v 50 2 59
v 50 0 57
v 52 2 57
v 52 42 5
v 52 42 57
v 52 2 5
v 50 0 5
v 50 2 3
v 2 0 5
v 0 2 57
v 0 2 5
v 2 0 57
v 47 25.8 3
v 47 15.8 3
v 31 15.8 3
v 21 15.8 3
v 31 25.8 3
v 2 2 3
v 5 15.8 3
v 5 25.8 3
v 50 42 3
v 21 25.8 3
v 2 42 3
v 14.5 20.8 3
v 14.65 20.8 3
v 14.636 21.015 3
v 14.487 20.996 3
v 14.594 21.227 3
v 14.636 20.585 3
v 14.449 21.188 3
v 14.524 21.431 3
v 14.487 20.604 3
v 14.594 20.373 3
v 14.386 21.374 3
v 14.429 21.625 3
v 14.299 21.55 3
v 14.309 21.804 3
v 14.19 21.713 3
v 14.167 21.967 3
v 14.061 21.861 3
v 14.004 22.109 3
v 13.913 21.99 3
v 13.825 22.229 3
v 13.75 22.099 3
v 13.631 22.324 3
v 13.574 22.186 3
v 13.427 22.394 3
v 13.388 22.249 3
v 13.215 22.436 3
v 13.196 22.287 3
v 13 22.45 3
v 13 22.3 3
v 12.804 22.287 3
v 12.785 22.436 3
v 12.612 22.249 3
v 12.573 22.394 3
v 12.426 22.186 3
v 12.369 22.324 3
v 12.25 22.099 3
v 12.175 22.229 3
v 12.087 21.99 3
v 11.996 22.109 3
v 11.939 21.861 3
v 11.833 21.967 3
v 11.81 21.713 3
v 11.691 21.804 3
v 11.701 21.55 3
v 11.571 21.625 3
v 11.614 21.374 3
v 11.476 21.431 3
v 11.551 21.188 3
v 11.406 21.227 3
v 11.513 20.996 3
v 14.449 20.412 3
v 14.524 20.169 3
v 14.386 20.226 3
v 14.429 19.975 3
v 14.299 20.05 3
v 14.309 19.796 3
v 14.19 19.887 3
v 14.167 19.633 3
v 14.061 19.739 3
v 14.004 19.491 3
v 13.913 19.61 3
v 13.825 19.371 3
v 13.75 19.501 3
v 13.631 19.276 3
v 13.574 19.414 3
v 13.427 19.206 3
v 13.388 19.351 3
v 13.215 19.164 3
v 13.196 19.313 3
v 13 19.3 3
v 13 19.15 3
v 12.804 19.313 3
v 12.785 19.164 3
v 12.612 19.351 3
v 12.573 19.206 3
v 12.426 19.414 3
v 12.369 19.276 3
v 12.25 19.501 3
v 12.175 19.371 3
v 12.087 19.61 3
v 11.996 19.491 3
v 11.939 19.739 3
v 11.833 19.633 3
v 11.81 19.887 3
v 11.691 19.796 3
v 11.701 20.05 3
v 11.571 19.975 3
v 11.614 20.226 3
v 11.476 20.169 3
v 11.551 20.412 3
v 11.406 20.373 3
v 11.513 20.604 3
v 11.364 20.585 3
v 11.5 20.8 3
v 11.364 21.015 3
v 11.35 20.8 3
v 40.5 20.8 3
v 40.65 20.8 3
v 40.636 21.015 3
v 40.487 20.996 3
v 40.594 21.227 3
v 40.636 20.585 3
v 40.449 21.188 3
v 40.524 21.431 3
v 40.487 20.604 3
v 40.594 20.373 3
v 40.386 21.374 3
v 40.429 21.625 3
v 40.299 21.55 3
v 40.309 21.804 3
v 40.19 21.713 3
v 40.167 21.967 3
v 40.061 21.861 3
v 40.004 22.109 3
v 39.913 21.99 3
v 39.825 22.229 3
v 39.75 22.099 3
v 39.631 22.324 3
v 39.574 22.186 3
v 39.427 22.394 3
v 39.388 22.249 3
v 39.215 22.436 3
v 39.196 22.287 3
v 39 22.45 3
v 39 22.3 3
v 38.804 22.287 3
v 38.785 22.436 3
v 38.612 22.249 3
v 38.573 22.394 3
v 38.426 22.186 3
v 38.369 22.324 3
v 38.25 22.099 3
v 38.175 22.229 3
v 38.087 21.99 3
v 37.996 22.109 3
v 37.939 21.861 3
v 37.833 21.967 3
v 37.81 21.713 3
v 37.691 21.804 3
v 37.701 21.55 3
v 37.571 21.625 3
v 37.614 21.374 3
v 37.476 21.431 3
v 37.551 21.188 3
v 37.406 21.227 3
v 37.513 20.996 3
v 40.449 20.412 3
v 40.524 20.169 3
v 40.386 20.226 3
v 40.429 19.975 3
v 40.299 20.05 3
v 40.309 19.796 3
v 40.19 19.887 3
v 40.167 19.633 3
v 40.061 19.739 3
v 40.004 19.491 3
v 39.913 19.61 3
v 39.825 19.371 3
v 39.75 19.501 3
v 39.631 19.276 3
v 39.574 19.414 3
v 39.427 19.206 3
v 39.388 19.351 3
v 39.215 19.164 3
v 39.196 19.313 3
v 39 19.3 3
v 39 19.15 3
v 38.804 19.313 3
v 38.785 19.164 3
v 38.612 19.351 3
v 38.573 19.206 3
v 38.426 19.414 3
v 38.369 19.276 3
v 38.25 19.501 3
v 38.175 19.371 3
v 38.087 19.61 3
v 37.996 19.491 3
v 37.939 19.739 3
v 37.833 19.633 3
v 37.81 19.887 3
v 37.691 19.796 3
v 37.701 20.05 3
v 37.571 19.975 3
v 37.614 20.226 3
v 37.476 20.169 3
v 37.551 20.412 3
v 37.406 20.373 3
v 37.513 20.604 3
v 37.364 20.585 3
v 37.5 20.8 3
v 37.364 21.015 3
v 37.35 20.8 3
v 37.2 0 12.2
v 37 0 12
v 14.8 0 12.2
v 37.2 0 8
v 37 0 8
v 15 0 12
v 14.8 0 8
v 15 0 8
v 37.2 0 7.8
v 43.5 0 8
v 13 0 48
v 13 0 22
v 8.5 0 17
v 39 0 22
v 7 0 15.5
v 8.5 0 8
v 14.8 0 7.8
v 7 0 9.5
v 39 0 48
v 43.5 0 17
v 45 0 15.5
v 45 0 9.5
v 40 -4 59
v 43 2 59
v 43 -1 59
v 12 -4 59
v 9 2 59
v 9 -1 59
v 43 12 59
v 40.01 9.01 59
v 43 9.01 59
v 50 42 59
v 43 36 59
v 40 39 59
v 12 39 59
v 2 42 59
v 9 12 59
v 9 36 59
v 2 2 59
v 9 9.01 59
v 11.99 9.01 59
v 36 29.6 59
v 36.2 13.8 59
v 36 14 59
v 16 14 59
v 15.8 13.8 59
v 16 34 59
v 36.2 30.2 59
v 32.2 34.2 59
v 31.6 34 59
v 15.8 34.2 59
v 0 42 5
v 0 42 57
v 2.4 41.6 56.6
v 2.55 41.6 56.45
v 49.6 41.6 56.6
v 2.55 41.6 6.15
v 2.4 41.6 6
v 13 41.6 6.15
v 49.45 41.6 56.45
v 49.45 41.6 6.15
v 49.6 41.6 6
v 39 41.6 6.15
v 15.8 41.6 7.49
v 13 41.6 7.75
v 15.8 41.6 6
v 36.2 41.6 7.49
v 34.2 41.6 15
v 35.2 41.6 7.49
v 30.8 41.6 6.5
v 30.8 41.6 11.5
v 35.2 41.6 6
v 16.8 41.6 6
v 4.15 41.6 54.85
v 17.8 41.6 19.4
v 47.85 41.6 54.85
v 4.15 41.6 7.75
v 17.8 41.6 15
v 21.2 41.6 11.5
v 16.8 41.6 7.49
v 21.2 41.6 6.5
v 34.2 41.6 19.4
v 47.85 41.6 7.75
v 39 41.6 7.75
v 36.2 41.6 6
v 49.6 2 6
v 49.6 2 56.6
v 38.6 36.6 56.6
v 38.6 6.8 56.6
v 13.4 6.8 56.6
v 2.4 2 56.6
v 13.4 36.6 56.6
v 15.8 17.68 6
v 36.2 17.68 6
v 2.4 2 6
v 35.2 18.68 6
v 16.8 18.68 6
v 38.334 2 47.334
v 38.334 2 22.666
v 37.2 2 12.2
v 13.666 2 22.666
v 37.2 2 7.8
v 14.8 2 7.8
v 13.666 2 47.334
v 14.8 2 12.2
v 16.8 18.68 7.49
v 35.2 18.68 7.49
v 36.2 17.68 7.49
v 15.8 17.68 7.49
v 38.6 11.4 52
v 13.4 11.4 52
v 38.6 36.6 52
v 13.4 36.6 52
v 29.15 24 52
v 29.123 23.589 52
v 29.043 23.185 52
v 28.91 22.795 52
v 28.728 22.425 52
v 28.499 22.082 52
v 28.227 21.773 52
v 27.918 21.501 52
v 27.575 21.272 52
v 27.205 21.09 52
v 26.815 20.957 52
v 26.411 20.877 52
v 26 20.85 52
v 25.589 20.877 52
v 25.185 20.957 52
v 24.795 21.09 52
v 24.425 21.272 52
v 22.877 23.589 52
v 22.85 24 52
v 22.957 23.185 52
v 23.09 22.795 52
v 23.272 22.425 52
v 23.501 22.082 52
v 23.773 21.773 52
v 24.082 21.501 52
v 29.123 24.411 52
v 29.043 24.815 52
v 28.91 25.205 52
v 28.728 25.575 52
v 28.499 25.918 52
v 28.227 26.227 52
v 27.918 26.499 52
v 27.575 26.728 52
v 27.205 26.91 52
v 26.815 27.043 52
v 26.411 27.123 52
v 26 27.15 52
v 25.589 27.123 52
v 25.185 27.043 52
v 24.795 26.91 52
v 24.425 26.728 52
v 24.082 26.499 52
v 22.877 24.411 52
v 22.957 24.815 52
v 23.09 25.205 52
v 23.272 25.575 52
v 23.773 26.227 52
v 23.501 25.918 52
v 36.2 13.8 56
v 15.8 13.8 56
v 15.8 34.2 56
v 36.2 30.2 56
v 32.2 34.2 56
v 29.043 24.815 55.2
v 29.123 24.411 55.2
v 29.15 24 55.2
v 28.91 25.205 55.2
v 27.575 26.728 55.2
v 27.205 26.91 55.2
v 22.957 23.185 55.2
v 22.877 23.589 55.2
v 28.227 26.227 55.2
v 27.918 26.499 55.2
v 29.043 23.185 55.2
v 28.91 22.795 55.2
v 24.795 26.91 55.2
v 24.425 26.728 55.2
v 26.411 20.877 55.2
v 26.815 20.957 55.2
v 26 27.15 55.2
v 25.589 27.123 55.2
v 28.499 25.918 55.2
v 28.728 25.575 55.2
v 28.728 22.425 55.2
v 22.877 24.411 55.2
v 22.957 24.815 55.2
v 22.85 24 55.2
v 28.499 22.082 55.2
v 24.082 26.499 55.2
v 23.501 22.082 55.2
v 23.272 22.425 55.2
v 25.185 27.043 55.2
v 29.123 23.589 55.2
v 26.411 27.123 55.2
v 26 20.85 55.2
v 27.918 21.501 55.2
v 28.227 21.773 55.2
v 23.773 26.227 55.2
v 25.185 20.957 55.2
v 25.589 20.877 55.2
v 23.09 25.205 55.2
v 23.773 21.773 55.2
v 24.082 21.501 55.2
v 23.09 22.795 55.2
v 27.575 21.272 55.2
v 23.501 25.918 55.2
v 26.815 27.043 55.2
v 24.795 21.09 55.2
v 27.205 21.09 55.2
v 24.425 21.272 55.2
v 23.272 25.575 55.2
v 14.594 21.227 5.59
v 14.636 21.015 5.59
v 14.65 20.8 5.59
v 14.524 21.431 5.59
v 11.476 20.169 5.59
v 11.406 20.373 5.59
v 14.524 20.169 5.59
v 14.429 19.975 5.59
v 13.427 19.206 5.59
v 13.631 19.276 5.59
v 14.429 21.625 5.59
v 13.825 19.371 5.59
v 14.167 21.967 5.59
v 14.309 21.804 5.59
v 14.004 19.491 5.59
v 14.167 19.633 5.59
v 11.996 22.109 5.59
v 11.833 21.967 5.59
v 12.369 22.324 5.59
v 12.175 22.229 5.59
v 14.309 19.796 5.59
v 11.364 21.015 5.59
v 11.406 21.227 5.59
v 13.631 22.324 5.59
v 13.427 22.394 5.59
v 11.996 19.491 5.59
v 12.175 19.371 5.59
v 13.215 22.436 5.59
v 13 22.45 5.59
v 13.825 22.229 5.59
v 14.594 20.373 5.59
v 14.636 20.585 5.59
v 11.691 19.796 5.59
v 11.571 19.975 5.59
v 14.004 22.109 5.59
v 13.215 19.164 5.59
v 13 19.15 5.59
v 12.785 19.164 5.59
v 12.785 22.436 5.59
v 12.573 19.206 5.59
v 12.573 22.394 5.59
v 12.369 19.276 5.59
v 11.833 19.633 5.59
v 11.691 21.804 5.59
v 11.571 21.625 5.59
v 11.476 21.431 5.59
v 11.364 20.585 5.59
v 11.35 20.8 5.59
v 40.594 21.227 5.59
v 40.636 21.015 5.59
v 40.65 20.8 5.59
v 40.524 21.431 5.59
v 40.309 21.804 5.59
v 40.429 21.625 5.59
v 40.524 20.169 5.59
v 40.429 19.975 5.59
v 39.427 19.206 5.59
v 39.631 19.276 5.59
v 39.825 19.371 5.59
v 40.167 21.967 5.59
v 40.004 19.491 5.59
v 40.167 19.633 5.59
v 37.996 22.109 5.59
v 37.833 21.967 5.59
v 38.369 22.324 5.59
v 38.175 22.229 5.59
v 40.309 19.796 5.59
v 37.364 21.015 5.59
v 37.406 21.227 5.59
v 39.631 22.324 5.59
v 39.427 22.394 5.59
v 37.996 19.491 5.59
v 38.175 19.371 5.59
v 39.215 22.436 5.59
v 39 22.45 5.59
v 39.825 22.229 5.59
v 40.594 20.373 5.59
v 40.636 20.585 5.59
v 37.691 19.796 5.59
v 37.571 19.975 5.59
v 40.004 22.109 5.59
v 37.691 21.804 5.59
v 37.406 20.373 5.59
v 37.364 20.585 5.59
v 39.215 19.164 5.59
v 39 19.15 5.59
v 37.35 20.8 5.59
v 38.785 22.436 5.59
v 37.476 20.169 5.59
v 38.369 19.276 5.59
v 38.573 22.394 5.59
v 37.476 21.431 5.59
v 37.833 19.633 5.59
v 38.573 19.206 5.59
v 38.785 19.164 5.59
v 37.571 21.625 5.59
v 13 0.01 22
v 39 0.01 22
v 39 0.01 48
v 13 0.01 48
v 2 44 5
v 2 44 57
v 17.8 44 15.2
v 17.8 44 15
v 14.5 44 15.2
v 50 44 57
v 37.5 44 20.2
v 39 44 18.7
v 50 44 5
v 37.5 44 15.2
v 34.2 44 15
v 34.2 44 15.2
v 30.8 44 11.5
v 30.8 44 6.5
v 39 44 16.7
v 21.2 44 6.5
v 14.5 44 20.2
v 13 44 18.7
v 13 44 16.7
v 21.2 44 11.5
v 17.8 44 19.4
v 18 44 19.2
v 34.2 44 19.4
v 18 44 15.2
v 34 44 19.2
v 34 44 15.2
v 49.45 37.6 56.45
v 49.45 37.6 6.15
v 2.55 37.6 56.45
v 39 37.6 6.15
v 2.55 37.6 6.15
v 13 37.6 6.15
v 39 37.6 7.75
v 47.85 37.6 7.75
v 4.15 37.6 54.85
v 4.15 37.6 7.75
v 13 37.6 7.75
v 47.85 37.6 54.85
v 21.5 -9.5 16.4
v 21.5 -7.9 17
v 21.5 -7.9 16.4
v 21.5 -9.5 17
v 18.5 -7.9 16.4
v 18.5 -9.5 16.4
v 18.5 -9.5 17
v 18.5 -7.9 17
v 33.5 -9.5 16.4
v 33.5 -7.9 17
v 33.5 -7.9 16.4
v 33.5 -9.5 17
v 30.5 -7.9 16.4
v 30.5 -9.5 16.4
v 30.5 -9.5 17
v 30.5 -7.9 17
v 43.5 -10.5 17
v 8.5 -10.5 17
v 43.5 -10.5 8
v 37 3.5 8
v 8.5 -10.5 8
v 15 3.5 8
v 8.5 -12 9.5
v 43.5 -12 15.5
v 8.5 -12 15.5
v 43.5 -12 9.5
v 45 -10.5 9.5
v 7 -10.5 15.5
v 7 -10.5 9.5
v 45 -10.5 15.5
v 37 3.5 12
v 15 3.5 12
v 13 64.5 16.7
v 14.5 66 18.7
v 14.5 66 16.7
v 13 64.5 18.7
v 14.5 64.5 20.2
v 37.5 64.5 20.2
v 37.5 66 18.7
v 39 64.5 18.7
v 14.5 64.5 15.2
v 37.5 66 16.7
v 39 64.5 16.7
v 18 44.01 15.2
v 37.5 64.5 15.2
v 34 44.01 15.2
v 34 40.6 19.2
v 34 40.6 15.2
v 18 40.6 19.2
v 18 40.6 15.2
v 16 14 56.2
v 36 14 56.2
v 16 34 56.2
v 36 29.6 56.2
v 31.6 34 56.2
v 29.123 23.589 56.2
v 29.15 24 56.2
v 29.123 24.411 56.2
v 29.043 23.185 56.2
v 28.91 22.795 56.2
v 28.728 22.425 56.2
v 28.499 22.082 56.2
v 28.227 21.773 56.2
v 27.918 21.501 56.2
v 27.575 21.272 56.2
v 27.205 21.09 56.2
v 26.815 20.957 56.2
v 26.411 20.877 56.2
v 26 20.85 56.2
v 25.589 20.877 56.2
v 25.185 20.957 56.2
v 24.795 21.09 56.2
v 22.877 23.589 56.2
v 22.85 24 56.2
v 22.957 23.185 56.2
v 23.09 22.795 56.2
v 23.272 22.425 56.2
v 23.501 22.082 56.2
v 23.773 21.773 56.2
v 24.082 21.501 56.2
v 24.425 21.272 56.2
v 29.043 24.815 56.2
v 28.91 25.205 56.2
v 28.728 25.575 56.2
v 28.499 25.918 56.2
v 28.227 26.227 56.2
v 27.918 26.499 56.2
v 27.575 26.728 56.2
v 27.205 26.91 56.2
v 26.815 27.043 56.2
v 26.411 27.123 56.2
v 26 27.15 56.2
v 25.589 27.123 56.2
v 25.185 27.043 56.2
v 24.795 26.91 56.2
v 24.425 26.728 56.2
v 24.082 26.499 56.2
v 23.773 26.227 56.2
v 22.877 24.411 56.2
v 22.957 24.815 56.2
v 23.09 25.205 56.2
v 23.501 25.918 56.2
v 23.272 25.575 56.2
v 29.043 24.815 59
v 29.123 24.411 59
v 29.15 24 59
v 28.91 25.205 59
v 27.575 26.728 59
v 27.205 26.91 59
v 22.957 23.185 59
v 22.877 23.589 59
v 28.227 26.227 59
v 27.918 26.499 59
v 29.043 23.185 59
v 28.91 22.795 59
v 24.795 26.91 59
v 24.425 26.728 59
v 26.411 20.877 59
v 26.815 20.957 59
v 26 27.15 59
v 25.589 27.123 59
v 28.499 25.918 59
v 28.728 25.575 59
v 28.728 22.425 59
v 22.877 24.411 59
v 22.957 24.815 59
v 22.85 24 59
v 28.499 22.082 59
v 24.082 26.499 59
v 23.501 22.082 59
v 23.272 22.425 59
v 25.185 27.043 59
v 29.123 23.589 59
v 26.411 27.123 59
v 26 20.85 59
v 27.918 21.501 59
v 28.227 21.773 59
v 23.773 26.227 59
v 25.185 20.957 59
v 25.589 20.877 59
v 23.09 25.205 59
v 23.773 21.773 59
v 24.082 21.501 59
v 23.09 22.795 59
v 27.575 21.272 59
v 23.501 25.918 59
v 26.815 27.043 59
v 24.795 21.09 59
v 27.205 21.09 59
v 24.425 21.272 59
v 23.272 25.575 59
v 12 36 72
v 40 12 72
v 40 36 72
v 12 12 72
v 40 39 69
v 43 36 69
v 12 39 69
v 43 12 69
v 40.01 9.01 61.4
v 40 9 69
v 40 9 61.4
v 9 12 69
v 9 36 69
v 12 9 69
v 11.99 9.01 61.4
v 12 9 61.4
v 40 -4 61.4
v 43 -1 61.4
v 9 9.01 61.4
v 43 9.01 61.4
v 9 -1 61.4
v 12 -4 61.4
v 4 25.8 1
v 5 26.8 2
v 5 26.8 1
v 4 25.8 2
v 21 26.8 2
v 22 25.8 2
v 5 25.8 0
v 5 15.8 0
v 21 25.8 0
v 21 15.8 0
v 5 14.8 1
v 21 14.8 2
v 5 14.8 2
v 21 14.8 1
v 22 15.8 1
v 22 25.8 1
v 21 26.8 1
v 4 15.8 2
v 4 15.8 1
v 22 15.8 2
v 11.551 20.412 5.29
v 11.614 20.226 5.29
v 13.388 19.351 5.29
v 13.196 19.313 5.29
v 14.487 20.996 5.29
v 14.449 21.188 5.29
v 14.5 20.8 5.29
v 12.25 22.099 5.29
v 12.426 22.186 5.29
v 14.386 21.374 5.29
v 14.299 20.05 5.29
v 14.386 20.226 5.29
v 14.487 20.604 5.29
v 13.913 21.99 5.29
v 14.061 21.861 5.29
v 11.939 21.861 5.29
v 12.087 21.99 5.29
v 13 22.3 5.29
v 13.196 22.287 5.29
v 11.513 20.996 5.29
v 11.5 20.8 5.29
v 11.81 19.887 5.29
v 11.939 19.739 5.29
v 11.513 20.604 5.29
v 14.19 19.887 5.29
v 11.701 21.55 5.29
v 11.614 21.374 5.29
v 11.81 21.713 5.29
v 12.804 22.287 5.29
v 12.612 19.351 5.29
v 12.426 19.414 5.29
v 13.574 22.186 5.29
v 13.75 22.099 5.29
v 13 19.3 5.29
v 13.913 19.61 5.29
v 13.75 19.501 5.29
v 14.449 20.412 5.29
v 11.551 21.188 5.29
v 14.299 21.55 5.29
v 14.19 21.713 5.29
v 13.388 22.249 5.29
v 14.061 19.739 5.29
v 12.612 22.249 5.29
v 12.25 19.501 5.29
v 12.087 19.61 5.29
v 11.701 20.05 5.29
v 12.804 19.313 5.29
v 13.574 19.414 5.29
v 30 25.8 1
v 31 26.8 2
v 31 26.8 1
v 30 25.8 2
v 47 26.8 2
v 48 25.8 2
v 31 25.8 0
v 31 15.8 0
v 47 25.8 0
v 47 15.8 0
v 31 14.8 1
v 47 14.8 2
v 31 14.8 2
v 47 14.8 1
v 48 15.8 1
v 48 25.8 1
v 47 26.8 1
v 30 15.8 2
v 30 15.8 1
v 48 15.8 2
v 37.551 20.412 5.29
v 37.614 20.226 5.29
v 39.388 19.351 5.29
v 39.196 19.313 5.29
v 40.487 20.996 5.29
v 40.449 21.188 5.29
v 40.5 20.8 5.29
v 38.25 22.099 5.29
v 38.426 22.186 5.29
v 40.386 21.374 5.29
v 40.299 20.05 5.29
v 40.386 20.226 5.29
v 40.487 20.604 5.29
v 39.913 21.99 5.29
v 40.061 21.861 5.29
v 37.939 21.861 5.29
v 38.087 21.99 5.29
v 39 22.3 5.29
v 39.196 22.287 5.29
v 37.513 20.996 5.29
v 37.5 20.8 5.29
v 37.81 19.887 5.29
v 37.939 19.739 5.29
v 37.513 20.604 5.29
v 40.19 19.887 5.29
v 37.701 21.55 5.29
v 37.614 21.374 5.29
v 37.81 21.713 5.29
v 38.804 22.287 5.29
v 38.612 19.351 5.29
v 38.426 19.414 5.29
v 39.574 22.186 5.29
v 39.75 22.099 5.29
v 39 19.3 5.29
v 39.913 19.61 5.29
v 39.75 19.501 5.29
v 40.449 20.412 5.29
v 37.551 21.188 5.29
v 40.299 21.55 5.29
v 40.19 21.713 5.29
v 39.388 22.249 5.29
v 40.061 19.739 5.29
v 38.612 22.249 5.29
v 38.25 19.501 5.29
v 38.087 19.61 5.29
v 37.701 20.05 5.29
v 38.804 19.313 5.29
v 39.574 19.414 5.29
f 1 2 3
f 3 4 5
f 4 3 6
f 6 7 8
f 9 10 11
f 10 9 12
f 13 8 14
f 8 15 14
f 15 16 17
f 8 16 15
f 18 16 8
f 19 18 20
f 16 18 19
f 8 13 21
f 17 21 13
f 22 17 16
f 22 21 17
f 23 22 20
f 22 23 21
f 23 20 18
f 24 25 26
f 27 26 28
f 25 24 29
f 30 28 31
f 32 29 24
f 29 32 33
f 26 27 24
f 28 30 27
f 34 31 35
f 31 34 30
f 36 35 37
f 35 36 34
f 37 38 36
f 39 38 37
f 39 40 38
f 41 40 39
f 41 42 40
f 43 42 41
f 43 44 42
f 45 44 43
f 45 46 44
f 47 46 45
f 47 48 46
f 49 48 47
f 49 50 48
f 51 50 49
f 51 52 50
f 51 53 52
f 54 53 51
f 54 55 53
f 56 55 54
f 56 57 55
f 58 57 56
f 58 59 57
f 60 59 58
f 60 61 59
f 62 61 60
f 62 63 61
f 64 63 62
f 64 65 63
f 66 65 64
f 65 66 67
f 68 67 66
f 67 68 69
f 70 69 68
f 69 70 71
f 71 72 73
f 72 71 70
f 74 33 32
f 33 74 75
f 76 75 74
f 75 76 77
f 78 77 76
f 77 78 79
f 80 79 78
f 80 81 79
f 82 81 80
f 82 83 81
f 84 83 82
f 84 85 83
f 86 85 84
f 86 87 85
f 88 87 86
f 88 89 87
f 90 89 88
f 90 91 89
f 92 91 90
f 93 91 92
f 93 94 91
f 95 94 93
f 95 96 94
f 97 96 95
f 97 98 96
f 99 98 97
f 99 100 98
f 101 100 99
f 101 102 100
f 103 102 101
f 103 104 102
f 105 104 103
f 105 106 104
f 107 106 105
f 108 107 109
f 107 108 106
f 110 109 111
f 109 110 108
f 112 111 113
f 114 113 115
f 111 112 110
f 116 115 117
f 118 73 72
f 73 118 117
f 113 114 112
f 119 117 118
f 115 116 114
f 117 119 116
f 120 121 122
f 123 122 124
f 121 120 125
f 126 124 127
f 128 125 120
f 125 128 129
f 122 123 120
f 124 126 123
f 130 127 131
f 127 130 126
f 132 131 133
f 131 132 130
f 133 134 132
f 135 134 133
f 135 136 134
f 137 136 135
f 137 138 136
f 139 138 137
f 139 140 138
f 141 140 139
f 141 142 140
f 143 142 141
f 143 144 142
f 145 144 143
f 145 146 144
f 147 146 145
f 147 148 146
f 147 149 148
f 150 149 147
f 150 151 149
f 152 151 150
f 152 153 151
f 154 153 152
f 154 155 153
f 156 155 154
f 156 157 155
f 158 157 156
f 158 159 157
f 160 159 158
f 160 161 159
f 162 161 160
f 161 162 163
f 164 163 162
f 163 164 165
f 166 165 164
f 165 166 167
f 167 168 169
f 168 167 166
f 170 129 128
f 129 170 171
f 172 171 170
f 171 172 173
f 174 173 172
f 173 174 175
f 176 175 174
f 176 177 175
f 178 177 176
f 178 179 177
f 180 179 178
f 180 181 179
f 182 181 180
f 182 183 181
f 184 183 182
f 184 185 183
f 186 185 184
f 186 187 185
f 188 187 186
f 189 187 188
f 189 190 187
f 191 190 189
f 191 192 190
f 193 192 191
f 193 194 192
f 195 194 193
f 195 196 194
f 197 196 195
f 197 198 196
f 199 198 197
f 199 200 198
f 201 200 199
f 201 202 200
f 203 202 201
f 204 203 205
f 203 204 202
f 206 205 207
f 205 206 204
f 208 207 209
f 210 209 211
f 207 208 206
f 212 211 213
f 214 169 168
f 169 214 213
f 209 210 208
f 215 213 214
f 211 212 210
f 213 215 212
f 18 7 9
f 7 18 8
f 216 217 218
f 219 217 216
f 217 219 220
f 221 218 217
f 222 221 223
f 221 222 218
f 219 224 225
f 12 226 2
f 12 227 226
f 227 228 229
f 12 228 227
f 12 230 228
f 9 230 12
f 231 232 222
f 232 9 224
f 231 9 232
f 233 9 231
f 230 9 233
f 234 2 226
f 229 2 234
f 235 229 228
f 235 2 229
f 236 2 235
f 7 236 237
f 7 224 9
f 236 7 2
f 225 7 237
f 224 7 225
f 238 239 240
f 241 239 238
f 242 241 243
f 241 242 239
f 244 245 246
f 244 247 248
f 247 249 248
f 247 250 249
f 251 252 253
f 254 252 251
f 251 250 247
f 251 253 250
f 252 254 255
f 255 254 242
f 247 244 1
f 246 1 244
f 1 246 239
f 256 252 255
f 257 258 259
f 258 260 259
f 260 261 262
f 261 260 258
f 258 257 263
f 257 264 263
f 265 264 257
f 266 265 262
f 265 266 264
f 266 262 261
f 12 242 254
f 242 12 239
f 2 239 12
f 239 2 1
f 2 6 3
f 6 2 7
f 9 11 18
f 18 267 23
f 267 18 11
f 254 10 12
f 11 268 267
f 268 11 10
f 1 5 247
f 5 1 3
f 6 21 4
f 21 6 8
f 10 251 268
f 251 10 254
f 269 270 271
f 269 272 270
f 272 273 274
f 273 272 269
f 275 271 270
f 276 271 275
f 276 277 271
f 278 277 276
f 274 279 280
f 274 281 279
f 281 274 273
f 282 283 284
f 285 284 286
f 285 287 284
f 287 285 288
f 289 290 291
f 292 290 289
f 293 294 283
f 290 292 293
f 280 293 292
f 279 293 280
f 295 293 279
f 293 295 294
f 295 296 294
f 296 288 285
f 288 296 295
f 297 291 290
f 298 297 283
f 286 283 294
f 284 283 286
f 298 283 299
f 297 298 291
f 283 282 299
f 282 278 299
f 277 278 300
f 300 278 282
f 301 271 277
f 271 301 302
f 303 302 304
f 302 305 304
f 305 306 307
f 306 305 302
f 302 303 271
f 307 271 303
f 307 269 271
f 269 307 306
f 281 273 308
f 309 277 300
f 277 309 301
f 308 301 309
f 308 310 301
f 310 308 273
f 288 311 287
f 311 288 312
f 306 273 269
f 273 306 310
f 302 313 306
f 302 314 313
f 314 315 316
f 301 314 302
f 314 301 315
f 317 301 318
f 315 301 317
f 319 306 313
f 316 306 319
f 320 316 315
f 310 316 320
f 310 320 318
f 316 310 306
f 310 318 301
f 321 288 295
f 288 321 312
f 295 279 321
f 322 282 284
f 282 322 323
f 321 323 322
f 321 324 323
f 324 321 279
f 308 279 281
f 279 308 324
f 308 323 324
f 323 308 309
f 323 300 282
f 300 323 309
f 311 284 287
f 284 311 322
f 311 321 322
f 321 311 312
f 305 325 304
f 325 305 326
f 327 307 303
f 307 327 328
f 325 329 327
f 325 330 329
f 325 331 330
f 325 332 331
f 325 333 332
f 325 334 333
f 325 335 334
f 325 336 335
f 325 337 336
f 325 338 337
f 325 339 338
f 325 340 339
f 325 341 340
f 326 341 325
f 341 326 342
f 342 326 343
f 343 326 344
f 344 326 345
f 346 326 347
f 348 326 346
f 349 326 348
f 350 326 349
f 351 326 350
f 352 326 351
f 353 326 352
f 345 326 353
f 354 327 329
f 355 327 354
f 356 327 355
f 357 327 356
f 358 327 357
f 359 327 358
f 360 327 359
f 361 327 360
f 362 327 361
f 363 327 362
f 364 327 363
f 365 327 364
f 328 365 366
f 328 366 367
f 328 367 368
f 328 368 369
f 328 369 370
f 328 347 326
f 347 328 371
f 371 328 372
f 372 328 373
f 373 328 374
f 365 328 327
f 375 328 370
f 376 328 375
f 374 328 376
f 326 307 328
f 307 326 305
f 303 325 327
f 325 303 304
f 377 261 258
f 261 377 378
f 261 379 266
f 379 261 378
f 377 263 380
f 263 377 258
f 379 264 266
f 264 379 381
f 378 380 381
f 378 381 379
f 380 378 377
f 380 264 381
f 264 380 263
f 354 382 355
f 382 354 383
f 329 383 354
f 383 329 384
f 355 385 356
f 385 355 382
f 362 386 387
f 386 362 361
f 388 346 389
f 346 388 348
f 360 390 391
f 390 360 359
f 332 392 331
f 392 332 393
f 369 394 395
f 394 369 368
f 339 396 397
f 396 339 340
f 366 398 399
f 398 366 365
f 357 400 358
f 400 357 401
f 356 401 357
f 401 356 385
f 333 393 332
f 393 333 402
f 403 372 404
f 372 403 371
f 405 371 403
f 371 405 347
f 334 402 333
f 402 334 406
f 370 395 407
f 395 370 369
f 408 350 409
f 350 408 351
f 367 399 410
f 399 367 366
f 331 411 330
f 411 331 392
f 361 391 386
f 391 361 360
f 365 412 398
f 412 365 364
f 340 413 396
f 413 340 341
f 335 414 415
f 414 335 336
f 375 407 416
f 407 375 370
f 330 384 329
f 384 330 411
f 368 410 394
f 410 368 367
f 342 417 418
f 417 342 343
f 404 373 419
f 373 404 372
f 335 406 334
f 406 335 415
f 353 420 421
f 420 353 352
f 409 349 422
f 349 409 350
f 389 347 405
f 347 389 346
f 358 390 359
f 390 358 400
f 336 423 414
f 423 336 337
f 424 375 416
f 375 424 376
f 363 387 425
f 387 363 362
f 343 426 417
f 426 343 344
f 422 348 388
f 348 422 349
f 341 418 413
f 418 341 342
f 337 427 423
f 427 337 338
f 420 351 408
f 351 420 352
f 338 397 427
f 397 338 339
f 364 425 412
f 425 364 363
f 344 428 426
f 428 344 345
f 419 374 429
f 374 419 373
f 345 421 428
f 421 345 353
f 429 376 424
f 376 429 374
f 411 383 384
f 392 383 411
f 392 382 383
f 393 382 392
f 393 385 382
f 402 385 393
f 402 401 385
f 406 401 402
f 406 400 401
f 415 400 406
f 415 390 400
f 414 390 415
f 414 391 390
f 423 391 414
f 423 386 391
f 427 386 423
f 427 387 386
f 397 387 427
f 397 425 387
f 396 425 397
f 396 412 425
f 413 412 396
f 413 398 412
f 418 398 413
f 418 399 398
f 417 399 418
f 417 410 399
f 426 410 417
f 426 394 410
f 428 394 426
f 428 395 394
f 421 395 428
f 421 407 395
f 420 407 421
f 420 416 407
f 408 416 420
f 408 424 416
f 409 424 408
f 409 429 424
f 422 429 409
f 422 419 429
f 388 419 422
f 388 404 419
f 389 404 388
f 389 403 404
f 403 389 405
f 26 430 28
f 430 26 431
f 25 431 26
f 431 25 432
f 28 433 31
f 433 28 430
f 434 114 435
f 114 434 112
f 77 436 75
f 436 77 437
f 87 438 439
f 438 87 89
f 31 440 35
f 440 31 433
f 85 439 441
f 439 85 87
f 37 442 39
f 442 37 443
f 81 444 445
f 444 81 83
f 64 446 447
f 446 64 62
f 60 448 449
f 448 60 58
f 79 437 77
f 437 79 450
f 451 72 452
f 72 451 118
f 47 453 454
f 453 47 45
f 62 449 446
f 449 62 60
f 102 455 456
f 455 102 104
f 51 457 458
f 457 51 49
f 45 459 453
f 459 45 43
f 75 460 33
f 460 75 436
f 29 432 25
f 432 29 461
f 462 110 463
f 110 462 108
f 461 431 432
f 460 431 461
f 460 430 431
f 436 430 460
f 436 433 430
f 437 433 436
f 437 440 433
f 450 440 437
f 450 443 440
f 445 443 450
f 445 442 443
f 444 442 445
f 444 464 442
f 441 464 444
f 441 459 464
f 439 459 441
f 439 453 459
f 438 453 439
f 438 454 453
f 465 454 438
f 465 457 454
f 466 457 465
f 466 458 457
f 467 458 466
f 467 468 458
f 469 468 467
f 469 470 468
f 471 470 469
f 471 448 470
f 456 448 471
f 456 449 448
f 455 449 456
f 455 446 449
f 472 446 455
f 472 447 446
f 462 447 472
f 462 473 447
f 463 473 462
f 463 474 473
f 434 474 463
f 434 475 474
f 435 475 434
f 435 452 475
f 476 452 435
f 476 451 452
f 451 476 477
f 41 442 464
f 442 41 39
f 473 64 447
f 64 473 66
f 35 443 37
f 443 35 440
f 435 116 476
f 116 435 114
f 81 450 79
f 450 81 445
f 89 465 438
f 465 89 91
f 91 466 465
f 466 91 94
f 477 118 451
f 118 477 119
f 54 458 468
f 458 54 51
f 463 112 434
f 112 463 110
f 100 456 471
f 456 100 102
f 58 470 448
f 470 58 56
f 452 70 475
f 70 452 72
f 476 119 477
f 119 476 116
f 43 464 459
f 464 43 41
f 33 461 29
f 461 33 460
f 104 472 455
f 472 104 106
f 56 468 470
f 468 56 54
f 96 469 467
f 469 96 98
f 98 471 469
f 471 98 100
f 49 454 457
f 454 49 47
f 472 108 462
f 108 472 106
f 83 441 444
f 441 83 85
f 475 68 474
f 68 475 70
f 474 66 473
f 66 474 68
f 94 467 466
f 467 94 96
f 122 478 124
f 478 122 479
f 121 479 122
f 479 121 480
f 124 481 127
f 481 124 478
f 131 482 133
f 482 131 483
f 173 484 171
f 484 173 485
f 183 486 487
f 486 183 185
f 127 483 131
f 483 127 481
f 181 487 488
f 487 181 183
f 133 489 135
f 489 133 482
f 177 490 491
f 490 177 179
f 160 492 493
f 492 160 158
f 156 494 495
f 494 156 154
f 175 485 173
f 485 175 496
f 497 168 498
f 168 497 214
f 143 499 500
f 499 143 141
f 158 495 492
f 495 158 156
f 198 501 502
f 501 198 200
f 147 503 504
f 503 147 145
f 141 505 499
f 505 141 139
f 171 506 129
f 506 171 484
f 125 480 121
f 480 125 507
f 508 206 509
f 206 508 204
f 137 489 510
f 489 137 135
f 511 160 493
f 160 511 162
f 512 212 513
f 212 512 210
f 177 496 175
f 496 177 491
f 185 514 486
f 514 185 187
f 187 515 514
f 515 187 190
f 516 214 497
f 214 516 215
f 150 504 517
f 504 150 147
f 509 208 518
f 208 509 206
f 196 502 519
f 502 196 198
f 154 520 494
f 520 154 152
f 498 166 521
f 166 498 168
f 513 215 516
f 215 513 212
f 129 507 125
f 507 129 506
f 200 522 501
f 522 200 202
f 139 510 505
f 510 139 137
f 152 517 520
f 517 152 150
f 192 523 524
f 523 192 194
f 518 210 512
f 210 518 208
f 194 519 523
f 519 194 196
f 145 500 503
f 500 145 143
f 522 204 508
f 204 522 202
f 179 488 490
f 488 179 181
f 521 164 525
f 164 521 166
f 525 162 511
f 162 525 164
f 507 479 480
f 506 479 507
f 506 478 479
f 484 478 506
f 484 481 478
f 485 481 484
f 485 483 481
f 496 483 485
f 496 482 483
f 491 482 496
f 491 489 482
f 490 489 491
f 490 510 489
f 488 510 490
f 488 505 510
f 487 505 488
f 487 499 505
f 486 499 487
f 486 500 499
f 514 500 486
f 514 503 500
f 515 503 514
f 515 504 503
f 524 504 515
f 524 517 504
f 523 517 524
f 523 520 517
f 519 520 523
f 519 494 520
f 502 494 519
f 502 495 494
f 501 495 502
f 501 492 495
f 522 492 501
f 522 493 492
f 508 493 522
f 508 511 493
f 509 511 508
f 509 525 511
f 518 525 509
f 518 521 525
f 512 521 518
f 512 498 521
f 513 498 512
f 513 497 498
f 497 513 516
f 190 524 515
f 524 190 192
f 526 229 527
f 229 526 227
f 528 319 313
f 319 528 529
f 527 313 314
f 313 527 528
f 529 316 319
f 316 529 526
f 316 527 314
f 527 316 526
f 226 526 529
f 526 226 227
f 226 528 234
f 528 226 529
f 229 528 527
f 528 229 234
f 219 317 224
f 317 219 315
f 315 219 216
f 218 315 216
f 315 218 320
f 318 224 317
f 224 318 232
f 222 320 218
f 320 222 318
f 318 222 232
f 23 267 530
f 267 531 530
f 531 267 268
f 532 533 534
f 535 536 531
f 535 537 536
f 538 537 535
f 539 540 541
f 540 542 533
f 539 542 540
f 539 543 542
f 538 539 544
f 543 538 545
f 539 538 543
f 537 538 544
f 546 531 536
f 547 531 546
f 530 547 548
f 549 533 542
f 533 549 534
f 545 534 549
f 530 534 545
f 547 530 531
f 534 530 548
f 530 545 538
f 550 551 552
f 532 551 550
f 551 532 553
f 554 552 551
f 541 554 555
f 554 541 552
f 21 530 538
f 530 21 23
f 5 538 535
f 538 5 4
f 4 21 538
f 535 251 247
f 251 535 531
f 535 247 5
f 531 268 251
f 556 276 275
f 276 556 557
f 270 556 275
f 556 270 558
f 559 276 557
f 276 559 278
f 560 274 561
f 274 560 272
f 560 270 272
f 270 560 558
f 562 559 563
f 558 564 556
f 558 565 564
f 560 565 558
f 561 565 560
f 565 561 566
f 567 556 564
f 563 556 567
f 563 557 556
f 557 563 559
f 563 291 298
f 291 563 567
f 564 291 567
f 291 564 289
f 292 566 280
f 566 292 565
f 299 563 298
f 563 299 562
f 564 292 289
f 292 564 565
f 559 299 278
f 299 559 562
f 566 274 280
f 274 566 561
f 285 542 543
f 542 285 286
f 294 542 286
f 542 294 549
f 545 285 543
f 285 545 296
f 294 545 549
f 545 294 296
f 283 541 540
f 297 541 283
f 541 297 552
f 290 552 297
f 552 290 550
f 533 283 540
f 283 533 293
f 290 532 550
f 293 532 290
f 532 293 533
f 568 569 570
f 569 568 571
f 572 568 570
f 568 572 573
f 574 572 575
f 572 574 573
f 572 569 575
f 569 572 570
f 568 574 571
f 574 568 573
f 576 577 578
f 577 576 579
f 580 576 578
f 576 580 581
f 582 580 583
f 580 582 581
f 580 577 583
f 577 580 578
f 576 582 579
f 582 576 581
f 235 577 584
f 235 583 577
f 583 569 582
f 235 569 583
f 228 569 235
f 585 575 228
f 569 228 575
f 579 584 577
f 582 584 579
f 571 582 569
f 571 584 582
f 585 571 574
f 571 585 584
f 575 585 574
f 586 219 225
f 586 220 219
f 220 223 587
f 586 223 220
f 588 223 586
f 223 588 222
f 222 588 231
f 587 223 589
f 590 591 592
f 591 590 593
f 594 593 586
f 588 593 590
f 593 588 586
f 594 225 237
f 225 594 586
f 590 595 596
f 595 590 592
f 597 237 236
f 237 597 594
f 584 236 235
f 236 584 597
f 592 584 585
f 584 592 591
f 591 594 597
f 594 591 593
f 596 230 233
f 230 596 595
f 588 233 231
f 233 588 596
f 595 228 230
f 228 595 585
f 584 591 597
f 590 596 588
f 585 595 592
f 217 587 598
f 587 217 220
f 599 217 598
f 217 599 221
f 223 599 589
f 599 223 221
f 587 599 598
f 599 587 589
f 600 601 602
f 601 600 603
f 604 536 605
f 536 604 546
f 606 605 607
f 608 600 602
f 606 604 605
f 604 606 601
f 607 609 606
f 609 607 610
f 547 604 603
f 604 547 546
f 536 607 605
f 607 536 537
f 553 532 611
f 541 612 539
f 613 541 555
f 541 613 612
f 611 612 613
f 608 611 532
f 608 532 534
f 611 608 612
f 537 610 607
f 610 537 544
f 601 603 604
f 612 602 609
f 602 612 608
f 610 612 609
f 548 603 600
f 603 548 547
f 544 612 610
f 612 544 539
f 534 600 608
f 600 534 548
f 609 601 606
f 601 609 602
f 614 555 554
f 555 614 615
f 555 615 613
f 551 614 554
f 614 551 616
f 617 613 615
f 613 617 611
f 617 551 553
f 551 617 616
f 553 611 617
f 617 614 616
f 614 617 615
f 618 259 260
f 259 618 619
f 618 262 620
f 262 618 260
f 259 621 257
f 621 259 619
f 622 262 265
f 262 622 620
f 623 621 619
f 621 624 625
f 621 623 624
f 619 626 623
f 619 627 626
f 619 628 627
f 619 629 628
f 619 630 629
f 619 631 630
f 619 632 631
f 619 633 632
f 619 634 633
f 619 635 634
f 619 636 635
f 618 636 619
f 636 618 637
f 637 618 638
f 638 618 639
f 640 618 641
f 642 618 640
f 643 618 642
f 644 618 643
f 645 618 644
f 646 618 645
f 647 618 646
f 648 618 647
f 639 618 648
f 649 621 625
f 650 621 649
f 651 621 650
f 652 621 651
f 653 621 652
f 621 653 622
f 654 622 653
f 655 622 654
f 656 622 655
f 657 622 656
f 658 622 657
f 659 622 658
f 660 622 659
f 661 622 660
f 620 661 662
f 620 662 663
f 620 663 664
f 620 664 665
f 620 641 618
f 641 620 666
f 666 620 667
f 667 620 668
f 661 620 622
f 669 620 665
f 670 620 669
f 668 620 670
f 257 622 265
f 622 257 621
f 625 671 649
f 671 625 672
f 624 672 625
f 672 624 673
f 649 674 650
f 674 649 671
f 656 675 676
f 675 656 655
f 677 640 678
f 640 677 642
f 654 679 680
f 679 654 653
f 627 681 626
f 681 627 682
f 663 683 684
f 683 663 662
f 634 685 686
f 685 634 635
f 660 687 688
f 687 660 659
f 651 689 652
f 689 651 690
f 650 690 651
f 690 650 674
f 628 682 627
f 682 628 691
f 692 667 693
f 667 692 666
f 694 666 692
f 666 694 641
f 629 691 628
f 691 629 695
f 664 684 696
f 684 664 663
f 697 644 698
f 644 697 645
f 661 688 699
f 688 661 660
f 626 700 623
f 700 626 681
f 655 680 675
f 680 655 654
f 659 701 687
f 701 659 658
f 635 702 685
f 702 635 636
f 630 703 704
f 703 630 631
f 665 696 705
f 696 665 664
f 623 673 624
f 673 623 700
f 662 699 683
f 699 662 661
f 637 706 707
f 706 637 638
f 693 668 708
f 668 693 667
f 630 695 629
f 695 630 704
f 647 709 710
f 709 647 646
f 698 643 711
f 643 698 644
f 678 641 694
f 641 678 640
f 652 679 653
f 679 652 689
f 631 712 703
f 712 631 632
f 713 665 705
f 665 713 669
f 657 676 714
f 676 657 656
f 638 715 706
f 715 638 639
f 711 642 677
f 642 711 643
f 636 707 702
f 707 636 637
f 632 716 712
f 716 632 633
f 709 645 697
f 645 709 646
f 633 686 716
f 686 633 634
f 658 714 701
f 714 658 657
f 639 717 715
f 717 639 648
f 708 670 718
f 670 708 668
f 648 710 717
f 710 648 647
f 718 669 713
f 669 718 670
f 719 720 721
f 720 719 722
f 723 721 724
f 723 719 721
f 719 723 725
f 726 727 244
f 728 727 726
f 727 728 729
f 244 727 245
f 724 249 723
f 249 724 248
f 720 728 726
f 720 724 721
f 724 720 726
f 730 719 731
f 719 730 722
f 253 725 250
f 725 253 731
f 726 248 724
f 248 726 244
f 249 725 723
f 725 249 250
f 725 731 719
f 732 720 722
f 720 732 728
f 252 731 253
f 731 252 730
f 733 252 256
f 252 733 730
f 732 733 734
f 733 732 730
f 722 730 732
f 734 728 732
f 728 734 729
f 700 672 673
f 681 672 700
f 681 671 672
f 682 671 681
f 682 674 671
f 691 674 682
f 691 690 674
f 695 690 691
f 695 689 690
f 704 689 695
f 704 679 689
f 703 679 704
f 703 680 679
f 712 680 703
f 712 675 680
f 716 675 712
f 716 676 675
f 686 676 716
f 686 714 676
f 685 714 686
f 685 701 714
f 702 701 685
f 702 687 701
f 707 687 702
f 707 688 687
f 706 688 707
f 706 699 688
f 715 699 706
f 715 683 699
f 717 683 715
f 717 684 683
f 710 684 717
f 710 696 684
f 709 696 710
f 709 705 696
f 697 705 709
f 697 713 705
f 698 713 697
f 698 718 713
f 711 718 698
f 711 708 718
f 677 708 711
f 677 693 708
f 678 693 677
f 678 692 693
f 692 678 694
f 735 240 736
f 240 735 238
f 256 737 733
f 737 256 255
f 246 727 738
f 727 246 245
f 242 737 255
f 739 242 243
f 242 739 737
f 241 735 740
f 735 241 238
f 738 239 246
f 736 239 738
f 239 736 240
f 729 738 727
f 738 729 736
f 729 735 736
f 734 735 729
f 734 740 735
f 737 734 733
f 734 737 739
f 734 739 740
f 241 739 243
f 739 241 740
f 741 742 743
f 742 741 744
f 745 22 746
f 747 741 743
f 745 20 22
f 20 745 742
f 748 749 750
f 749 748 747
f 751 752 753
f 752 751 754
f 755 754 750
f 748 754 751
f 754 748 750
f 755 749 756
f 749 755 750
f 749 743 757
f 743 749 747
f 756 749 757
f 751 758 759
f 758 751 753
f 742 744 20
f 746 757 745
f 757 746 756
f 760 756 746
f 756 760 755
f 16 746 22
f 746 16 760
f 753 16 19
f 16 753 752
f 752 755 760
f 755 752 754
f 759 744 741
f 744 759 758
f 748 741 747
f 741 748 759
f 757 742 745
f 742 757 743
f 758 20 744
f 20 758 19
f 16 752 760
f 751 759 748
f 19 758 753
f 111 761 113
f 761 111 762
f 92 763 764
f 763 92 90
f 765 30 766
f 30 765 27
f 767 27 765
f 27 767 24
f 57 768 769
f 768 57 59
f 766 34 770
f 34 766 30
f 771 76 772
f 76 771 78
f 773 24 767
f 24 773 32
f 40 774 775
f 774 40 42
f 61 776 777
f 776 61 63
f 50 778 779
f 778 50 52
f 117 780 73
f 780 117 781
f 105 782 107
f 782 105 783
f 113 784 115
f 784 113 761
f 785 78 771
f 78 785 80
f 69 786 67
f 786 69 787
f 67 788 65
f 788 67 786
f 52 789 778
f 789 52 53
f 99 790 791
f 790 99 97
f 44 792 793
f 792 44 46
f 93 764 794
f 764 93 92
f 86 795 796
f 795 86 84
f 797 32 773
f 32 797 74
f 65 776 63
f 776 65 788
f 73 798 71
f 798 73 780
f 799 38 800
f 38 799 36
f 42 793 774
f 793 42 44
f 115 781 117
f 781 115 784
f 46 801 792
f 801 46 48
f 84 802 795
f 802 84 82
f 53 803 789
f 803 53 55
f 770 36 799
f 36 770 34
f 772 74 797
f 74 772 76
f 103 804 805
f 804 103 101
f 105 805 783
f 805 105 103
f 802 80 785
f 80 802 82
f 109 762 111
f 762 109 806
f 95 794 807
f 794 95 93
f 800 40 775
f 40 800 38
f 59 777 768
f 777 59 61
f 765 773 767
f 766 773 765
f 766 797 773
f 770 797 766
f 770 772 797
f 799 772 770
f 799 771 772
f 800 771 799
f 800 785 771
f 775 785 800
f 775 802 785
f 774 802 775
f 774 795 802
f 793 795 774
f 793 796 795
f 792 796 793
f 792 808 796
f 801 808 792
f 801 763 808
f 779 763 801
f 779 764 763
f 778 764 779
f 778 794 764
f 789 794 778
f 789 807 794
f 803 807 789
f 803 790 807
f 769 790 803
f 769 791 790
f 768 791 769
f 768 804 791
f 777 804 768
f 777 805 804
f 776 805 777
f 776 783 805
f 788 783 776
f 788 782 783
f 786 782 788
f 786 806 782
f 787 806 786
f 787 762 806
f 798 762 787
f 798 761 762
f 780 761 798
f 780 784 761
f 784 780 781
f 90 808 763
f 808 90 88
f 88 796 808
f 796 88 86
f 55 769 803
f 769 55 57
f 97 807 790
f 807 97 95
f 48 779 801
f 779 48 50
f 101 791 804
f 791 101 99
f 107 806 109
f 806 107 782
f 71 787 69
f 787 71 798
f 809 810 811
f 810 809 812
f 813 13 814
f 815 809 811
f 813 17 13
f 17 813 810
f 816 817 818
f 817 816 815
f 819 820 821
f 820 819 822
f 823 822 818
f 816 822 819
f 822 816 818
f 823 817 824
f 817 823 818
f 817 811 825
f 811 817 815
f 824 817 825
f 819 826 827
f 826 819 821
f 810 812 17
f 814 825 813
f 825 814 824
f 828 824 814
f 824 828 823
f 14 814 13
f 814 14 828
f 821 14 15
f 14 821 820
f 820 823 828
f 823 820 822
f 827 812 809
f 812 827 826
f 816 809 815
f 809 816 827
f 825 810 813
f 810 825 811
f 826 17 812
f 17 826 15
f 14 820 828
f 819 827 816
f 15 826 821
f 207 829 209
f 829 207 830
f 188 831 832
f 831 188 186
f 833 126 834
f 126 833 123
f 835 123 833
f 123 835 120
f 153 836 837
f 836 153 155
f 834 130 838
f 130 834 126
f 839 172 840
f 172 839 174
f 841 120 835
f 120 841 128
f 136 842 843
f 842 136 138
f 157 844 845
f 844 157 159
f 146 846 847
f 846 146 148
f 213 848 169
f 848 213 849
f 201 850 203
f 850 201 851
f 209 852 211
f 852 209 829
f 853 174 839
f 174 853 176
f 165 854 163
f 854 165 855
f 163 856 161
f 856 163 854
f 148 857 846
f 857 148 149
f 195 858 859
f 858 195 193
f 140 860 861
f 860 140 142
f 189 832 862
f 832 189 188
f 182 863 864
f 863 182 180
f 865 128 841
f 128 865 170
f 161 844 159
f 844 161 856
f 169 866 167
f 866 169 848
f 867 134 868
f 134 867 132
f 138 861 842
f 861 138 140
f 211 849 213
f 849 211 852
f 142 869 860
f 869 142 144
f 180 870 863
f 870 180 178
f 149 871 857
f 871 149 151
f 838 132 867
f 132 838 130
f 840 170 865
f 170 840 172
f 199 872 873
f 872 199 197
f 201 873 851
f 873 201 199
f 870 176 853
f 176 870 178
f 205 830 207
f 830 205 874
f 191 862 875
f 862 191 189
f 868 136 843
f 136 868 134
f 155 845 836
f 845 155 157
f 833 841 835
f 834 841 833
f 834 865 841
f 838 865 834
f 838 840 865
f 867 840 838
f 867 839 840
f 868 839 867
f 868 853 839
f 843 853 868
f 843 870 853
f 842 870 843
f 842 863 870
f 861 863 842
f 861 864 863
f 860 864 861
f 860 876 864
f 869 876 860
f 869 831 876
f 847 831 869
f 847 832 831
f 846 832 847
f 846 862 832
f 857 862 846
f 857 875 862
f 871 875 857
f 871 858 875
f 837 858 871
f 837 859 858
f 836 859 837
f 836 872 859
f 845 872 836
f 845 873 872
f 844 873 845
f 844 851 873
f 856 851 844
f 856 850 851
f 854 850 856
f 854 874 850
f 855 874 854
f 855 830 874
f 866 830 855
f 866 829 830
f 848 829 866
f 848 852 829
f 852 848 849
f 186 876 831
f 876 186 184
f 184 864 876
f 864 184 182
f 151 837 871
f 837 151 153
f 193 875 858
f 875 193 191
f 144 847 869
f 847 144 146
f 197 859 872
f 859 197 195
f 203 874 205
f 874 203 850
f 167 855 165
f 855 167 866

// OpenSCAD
// =====================================================================
//  Cubo modular · v3 · pantalla 1,3"  (basado en la electrónica de clawd-mochi, MIT)
//  Carcasa nueva y paramétrica. Unidades: mm.
//
//  Ejes: X = ancho (izq->dcha), Y = fondo (frente y=0 -> detrás),
//        Z = alto (suelo z=0). El frente es la cara de la pantalla.
//
//  Elegir pieza:  openscad -D 'parte="carcasa"' -o carcasa.stl cubo.scad
//  Piezas: carcasa, tapa_trasera, pico, cola, patas, gorra,
//          base_accesorio, prueba_encaje, ensamblaje (solo vista)
// =====================================================================

parte = "ensamblaje";

/* ---------- Cuerpo ---------- */
W      = 52;     // ancho exterior
H      = 56;     // alto exterior (sin patas)
D      = 44;     // fondo total (carcasa + tapa trasera)
CH     = 2;      // chaflán de las aristas exteriores
pared  = 2.4;    // paredes laterales
frente = 2.0;    // pared frontal (la de la pantalla)
suelo  = 3.0;    // suelo
techo  = 2.4;    // techo
T_tapa = 2.4;    // grosor de la tapa trasera
D_c    = D - T_tapa;   // fondo de la carcasa

/* ---------- Pantalla ST7789 1,3" (240x240) ---------- */
// Zona activa del panel: 23,40 x 23,40 mm. La ventana deja 0,3 mm de margen.
// (Para volver a 1,54": ventana = 28.4)
ventana   = 24.0;
ventana_z = 32;    // altura del centro de la ventana
bisel     = 1.0;   // bisel exterior de la ventana

/* ---------- Enchufe de accesorios (estándar común) ---------- */
enchufe      = 20;    // lado nominal del tapón
holgura      = 0.2;   // holgura por lado (ajustar con prueba_encaje)
enchufe_prof = 3;     // profundidad del hueco
llave        = 4;     // esquina cortada (detrás-derecha) que fija la orientación
enchufe_y    = 24;    // posición en fondo del centro del enchufe
iman_d       = 6.3;   // imán Ø6 x 3 mm (+holgura)
iman_h       = 3.2;
piel         = 0.8;   // plástico entre imán y fondo del hueco

/* ---------- Pico y cola (encaje a presión) ---------- */
pico_w = 38;  pico_l = 12;  pico_h = 9;  pico_z = 5;
lengua_w = 22; lengua_h = 4; lengua_l = 3.5;
cola_w = 26;  cola_l = 22;  cola_h = 5;  cola_z = 12.2;
cola_lengua_w = 16; cola_lengua_h = 4; cola_lengua_l = 3.4;
ajuste = 0.2;          // holgura por lado en ranuras de pico/cola/tapa

/* ---------- ESP32-C3 Super Mini ---------- */
esp_w = 18;  esp_l = 22.52;
usb_w = 9.6; usb_h = 5; usb_z = suelo + 3;   // centro del hueco USB-C

/* ---------- Patas ---------- */
pata_w = 18; pata_l = 12; pata_h = 3; pata_sep = 13; pivote_d = 3;

$fn = 48;
e = 0.01;

// ---------------------------------------------------------------
module caja_chaflan(s, c) {
    hull() {
        translate([c, 0, c]) cube([s[0]-2*c, s[1], s[2]-2*c]);
        translate([0, c, c]) cube([s[0], s[1]-2*c, s[2]-2*c]);
        translate([c, c, 0]) cube([s[0]-2*c, s[1]-2*c, s[2]]);
    }
}

// Perfil cuadrado con la esquina (+X,+Y) cortada. Centrado en el origen.
module perfil_llave(lado, corte) {
    a = lado/2;
    polygon([[-a,-a],[a,-a],[a,a-corte],[a-corte,a],[-a,a]]);
}

// Un único imán centrado. La esquina cortada fija la orientación.
module huecos_iman(z0) {
    translate([0, 0, z0]) cylinder(d = iman_d, h = iman_h);
}

// Hueco hembra (en cabeza o en prueba). z_sup = cara superior.
module enchufe_hembra(z_sup) {
    translate([0, 0, z_sup - enchufe_prof])
        linear_extrude(enchufe_prof + 1) perfil_llave(enchufe + 2*holgura, llave);
    huecos_iman(z_sup - enchufe_prof - piel - iman_h);
}

// Tapón macho estándar que llevan todos los accesorios (debajo de z=0).
tapon_h = enchufe_prof - 0.2;
module tapon() {
    difference() {
        translate([0, 0, -tapon_h]) linear_extrude(tapon_h + e)
            perfil_llave(enchufe, llave + 0.4);
        huecos_iman(-tapon_h - e);
    }
}

// ---------------------------------------------------------------
module cuerpo_exterior() { caja_chaflan([W, D, H], CH); }

module carcasa() {
    boss = enchufe + 2*holgura + 2*2.4;
    z_boss = H - enchufe_prof - piel - iman_h;
    difference() {
        union() {
            difference() {
                intersection() { cuerpo_exterior(); translate([-1, -1, -1]) cube([W+2, D_c+1, H+2]); }
                translate([pared, frente, suelo]) cube([W - 2*pared, D_c, H - suelo - techo]);
            }
            // Refuerzo bajo el enchufe, con rampa a 45° para imprimir sin soportes
            translate([W/2, enchufe_y, 0]) hull() {
                translate([-boss/2, -boss/2, z_boss]) cube([boss, boss, H - techo - z_boss + e]);
                translate([-boss/2, -boss/2 - (H - techo - z_boss), H - techo]) cube([boss, boss + (H - techo - z_boss), e]);
            }
            // Guías para la ESP32 en el suelo (pegada con cinta)
            translate([W/2, D_c, suelo - e]) {
                for (s = [-1, 1]) translate([s*(esp_w/2 + 0.2 + 0.5) - 0.5, -(esp_l + 0.4) - 1, 0]) cube([1, esp_l + 1.4, 1.5]);
                translate([-(esp_w/2 + 1.2), -(esp_l + 0.4) - 1, 0]) cube([esp_w + 2.4, 1, 1.5]);
            }
        }
        // Ventana de la pantalla con bisel exterior
        translate([W/2, 0, ventana_z]) hull() {
            translate([-ventana/2, frente/2, -ventana/2]) cube([ventana, frente/2 + 1, ventana]);
            translate([-ventana/2 - bisel, -1, -ventana/2 - bisel]) cube([ventana + 2*bisel, 1 + e, ventana + 2*bisel]);
        }
        // Ranura del pico
        translate([W/2 - lengua_w/2 - ajuste, -1, pico_z - ajuste]) cube([lengua_w + 2*ajuste, frente + 2, lengua_h + 2*ajuste]);
        // Enchufe de accesorios + imanes (los imanes se meten desde dentro)
        translate([W/2, enchufe_y, 0]) enchufe_hembra(H);
        // Agujeros de las patas
        for (s = [-1, 1]) translate([W/2 + s*pata_sep, D_c/2, -e]) cylinder(d = pivote_d + 0.3, h = 2.6);
    }
}

module tapa_trasera() {
    lab = 1.6; lab_l = 4;
    ox = W - 2*pared - 2*0.15; oz = H - suelo - techo - 2*0.15;
    difference() {
        union() {
            intersection() { cuerpo_exterior(); translate([-1, D_c, -1]) cube([W+2, T_tapa + 1, H+2]); }
            // Labio que entra a presión en la carcasa (con hueco abajo para la ESP32)
            translate([pared + 0.15, D_c - lab_l, suelo + 0.15]) difference() {
                cube([ox, lab_l + e, oz]);
                translate([lab, -1, lab]) cube([ox - 2*lab, lab_l + 2, oz - 2*lab]);
                translate([ox/2 - 13, -1, -1]) cube([26, lab_l + 2, lab + 2]);
            }
        }
        // Hueco USB-C
        translate([W/2 - usb_w/2, D_c - lab_l - 1, usb_z - usb_h/2]) cube([usb_w, T_tapa + lab_l + 2, usb_h]);
        // Ranura de la cola
        translate([W/2 - cola_lengua_w/2 - ajuste, D_c - 1, cola_z - ajuste]) cube([cola_lengua_w + 2*ajuste, T_tapa + 2, cola_lengua_h + 2*ajuste]);
    }
}

module pico() {
    // Coordenadas de montaje: cara trasera del pico en y=0, se extiende hacia -Y
    translate([W/2 - pico_w/2, -pico_l, pico_z]) difference() {
        caja_chaflan([pico_w, pico_l + CH, pico_h], 1.5);
        translate([-1, pico_l, -1]) cube([pico_w + 2, CH + 1, pico_h + 2]);  // cara trasera plana
        for (s = [-1, 1]) translate([pico_w/2 + s*6 - 1.5, 2.5, pico_h - 0.6]) cube([3, 1.6, 1]);  // fosas
    }
    translate([W/2 - lengua_w/2, -e, pico_z]) cube([lengua_w, lengua_l + e, lengua_h]);
}

module cola() {
    translate([W/2 - cola_w/2, D, cola_z]) difference() {
        translate([0, -CH, 0]) caja_chaflan([cola_w, cola_l + CH, cola_h], 1.5);
        translate([-1, -CH - 1, -1]) cube([cola_w + 2, CH + 1, cola_h + 2]);
    }
    translate([W/2 - cola_lengua_w/2, D - T_tapa - (cola_lengua_l - T_tapa), cola_z]) cube([cola_lengua_w, cola_lengua_l + e, cola_lengua_h]);
}

module pata() {
    caja_chaflan([pata_w, pata_l, pata_h], 1);
    translate([pata_w/2, pata_l/2, pata_h - e]) cylinder(d = pivote_d, h = 2.3);
}

module gorra() {
    // Accesorio de ejemplo. Visera hacia -Y (frente).
    cw = 34; cl = 30; chh = 13;
    tapon();
    intersection() {   // copa con chaflán solo arriba
        translate([-cw/2, -cl/2, -3]) caja_chaflan([cw, cl, chh + 3], 3);
        translate([-cw, -cl, 0]) cube([2*cw, 2*cl, chh + 1]);
    }
    translate([-cw/2, -cl/2 - 13, 0]) hull() {
        translate([3, 0, 0]) cube([cw - 6, 13 + e, 2.4]);
        translate([0, 3, 0]) cube([cw, 10 + e, 2.4]);
    }
}

module base_accesorio() {
    // Plantilla para diseñar accesorios nuevos: tapón + plataforma de 26 x 26
    tapon();
    translate([-13, -13, 0]) cube([26, 26, 2]);
}

module prueba_encaje() {
    // Bloque pequeño con el mismo hueco que la cabeza, para calibrar la holgura
    s = 28; h = enchufe_prof + piel + iman_h;
    difference() {
        translate([-s/2, -s/2, 0]) cube([s, s, h]);
        enchufe_hembra(h);
        huecos_iman(-e);
        translate([0, -s/2 + 0.6, h/2]) rotate([90, 0, 0]) linear_extrude(1)
            text(str(holgura), size = 4, halign = "center", valign = "center");
    }
}

// --------------------- Orientaciones de impresión ---------------------
if (parte == "carcasa")        rotate([90, 0, 0]) carcasa();   // frente sobre la cama
if (parte == "tapa_trasera")   translate([0, 0, D]) rotate([-90, 0, 0]) translate([0, 0, 0]) tapa_trasera();
if (parte == "pico")           translate([0, 0, -pico_z]) pico();
if (parte == "cola")           translate([0, 0, -cola_z]) cola();
if (parte == "patas")          for (i = [0, 1]) translate([i*(pata_w + 5), 0, 0]) pata();
if (parte == "gorra")          translate([0, 0, 15]) rotate([-90, 0, 0]) gorra();
if (parte == "base_accesorio") translate([0, 0, 2]) rotate([180, 0, 0]) base_accesorio();
if (parte == "prueba_encaje")  prueba_encaje();

if (parte == "ensamblaje") {
    translate([0, 0, pata_h]) {
        color("#031428") carcasa();
        color("#0b2140") tapa_trasera();
        color("#C1D42F") pico();
        color("#031428") cola();
        color("#C1D42F") translate([W/2, enchufe_y, H]) gorra();
    }
    color("#C1D42F") for (s = [-1, 1]) translate([W/2 + s*pata_sep - pata_w/2, D_c/2 - pata_l/2, 0]) pata();
}
